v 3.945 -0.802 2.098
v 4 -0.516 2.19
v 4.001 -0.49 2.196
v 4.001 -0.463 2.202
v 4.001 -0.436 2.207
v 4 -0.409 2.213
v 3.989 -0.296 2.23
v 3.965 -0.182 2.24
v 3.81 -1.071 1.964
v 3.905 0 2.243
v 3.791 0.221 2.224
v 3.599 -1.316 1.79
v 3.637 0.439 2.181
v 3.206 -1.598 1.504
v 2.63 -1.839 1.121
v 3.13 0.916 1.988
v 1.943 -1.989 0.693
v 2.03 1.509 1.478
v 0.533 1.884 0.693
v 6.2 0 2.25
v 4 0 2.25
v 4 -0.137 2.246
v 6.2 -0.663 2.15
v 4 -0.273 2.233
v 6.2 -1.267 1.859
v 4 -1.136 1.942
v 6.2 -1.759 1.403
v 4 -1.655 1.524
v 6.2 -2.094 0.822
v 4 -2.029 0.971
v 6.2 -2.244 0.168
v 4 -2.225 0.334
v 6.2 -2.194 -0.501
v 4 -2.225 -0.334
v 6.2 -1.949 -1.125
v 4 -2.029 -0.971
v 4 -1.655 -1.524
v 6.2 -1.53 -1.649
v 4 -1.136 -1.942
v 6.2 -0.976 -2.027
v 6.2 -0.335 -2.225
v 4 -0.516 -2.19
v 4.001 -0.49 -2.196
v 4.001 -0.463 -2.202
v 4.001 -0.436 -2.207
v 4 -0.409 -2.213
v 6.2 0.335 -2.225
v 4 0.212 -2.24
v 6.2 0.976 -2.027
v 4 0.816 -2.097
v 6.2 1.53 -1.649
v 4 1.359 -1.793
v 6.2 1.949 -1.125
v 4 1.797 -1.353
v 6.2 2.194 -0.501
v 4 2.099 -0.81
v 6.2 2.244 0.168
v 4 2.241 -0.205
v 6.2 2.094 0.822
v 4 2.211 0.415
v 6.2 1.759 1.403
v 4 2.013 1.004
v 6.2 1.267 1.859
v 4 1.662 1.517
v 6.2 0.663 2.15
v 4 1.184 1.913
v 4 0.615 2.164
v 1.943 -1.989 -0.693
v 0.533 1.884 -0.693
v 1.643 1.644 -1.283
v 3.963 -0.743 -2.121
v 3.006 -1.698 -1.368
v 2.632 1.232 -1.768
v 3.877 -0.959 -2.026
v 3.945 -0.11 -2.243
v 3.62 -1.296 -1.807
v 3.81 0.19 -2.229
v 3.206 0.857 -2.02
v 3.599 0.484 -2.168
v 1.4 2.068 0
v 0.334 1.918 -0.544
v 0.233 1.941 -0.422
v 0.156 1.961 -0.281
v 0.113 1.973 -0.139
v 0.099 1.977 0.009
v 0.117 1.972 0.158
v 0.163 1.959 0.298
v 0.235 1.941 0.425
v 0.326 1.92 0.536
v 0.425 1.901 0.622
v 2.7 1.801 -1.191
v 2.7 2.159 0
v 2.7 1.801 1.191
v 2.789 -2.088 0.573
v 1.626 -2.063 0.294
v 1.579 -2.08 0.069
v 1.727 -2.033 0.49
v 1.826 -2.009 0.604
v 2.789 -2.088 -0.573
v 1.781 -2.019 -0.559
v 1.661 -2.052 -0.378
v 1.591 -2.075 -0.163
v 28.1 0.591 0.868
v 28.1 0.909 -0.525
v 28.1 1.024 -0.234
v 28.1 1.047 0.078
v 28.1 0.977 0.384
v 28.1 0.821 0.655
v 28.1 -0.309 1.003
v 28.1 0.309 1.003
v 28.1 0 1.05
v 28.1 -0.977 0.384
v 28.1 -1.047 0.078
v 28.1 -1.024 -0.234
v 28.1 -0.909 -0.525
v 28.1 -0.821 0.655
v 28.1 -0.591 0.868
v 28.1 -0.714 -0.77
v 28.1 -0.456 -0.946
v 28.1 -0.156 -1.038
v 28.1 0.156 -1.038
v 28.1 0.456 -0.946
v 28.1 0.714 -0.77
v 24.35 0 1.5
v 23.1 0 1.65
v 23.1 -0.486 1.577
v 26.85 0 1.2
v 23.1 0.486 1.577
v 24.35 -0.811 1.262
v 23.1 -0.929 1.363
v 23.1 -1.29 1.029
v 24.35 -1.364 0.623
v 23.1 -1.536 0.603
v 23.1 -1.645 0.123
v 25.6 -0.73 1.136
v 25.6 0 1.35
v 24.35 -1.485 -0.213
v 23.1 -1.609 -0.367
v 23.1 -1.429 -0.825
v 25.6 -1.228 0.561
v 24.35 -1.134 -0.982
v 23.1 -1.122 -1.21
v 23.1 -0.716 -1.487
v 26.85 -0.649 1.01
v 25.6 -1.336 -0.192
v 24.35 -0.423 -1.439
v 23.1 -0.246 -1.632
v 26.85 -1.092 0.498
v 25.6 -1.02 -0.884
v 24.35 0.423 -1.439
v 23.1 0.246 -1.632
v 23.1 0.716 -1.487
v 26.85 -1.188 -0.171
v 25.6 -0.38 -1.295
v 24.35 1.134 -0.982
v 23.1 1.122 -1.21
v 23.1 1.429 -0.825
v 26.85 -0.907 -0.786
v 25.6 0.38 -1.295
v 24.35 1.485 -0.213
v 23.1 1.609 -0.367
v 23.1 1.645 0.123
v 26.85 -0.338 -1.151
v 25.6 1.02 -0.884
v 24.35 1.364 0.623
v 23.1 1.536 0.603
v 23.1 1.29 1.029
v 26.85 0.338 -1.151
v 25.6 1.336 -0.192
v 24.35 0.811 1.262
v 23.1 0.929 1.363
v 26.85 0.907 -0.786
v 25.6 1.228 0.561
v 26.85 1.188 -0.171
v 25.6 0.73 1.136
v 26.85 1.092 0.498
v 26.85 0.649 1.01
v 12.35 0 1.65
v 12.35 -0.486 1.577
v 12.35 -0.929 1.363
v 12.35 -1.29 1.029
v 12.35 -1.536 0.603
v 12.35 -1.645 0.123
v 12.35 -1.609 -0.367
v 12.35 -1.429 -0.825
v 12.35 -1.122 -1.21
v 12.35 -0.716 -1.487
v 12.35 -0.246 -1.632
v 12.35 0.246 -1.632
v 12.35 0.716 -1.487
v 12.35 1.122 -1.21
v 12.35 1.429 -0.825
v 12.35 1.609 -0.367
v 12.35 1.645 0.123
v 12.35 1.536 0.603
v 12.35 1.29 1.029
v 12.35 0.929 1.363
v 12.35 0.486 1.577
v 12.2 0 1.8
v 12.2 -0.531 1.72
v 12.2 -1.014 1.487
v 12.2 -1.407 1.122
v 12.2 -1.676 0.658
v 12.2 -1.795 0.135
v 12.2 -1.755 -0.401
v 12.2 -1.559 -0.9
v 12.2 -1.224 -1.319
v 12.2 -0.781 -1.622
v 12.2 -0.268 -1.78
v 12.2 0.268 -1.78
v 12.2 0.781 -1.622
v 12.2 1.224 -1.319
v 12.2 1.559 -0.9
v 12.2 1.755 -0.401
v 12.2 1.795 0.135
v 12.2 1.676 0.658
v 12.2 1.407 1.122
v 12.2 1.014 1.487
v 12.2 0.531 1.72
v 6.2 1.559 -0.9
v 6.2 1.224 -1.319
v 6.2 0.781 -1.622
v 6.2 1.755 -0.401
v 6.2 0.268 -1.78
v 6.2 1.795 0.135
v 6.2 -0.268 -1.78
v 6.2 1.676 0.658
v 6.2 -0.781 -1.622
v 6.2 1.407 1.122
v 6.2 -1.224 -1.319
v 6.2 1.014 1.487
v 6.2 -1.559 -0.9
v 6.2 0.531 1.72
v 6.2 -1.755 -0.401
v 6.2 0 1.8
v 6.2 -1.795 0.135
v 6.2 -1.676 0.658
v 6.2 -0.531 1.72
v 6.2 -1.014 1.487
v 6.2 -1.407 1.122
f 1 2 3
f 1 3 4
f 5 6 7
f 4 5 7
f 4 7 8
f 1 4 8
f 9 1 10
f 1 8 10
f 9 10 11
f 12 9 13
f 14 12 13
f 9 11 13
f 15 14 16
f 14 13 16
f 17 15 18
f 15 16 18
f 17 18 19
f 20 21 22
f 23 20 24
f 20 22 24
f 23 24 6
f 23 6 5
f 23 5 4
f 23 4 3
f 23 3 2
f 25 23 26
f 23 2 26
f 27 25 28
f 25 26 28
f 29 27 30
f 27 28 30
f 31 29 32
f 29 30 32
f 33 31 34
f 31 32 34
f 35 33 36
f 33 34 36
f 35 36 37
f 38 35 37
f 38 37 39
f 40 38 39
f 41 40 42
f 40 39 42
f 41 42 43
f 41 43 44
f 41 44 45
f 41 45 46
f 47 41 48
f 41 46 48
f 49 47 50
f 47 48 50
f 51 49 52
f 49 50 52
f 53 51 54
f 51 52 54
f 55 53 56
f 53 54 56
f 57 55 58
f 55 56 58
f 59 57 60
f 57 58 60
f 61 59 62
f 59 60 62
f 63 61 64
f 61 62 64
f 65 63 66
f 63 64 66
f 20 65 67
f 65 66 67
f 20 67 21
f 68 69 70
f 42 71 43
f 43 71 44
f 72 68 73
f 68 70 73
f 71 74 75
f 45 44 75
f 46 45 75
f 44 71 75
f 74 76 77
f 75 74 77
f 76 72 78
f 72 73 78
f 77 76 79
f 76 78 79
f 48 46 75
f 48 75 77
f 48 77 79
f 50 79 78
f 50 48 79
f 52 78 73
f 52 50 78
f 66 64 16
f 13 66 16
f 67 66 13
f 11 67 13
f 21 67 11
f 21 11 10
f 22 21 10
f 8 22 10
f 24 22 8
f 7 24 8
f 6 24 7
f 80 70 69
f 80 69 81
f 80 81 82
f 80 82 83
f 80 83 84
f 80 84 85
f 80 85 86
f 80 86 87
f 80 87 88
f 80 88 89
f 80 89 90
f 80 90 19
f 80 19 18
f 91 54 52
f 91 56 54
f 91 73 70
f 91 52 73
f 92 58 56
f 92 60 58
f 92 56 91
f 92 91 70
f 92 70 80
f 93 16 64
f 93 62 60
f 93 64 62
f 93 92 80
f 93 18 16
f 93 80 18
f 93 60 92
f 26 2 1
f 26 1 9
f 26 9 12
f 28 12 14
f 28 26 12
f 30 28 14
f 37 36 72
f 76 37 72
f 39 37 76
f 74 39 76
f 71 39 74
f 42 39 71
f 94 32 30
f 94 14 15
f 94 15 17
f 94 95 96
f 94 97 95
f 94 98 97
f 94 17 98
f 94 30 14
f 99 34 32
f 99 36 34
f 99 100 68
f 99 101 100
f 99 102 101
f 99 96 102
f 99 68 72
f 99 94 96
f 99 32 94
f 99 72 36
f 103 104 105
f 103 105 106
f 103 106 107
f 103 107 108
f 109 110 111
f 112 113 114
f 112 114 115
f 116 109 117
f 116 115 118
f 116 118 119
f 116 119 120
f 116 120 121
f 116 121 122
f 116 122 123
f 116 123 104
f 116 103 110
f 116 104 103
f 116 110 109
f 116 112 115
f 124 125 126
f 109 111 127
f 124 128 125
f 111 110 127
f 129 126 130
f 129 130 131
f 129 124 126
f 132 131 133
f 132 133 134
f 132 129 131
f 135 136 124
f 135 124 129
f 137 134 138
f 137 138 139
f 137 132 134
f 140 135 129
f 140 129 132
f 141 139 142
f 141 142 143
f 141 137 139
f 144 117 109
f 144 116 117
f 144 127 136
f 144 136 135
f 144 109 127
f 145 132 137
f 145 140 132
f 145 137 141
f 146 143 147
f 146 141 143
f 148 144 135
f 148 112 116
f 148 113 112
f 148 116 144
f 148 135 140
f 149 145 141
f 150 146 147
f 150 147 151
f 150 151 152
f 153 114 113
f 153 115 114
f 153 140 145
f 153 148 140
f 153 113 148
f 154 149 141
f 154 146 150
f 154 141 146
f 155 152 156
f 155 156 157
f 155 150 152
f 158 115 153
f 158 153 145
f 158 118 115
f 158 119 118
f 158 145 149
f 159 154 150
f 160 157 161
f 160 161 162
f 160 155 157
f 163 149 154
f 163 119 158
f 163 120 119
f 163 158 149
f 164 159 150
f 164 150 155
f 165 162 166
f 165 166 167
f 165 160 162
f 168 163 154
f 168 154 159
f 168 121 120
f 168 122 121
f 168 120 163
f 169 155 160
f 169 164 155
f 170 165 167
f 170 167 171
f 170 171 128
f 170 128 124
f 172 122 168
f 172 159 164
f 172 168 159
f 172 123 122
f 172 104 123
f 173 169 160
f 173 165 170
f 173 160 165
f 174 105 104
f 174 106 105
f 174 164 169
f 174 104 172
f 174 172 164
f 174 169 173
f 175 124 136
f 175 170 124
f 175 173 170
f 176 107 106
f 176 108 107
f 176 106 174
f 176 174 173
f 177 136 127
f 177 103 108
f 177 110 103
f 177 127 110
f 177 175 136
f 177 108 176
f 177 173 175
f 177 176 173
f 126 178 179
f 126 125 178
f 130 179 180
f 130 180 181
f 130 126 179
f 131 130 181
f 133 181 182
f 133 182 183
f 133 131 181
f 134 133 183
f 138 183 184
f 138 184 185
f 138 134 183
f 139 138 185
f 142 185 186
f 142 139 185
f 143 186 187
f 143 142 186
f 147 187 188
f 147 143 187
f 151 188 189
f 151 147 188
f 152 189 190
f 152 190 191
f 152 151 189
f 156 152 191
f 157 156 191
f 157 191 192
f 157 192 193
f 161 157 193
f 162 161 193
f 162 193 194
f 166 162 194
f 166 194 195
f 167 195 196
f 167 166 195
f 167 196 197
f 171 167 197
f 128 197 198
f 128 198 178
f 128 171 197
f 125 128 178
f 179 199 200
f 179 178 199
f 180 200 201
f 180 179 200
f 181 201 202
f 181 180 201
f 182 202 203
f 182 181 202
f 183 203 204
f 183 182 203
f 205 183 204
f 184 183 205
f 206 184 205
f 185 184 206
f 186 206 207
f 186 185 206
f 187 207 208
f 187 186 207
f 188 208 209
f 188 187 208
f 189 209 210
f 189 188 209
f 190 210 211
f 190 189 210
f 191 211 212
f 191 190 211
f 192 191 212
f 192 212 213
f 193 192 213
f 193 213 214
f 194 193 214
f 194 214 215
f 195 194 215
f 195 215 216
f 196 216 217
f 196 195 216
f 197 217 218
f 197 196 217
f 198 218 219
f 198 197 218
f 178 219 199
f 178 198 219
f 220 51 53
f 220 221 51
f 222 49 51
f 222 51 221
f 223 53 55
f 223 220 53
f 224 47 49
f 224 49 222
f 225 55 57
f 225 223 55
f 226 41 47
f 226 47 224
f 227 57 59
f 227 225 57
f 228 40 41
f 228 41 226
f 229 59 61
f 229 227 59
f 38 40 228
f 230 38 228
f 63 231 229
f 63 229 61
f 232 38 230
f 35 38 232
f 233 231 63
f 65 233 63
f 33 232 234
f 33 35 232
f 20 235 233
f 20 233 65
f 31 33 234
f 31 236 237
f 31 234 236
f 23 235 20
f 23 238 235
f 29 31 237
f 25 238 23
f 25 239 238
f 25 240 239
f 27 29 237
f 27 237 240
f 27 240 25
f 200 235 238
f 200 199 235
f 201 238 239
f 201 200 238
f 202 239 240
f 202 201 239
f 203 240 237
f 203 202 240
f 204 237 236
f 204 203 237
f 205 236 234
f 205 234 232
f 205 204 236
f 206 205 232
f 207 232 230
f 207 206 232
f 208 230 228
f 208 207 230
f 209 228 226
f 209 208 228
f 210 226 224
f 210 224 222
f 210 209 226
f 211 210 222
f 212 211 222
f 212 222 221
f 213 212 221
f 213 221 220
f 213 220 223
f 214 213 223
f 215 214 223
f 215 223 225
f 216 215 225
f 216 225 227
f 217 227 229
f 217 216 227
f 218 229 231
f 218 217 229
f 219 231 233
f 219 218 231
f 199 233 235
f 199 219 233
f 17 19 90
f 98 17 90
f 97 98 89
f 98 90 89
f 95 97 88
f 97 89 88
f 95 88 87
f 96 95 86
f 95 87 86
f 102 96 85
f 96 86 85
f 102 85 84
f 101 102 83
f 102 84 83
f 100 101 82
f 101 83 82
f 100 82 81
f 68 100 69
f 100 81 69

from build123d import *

# Parameters (mm, degrees)
CORTE_EXTRUS_O2_DEPTH = 5
CORTE_EXTRUS_O1_DEPTH = 10


with BuildPart() as part:
    # Esboço1 → Revolução1 (revolve)
    with BuildSketch(Plane.XY, mode=Mode.PRIVATE) as revolu_o1_sk:
        Polygon((6.2, 2.25), (6.2, 1.8), (12.2, 1.8), (12.35, 1.65), (23.1, 1.65), (28.1, 1.05), (28.1, 0), (0, 0), (0, 1.970292752), (4, 2.25), (4.7, 2.25), align=None)
    revolve(revolu_o1_sk.sketch.rotate(Axis((0, 0, 0), (1, 0, 0)), 90), axis=Axis((0, 0, 0), (1, 0, 0)))

    # Esboço2 → Corte-extrusão2 (cut, symmetric)
    with BuildSketch(Plane.XY):
        Polygon((0, 1.970292752), (1.471712801, -2.073204936), (2.326234143, -4.420983029), (-0.931248246, -4.420983029), (-0.931248246, 3.056454726), (-0.395330628, 3.056454726), align=None)
    extrude(amount=CORTE_EXTRUS_O2_DEPTH, both=True, mode=Mode.SUBTRACT)

    # Esboço3 → Corte-extrusão1 (cut, along a direction that is not the sketch's normal)
    with BuildSketch(Plane(origin=(3.863561719, 2.25, 0), x_dir=(0, 0, -1), z_dir=(0, 1, 0))):
        with BuildLine():
            Line((-4.503319596, -3.136438281), (-0.692801568, 3.463572547))
            ThreePointArc((-0.692801568, 3.463572547), (0, 3.863561719), (0.692801568, 3.463572547))
            Line((0.692801568, 3.463572547), (4.503319596, -3.136438281))
            ThreePointArc((4.503319596, -3.136438281), (0, 13.670179255), (-4.503319596, -3.136438281))
        make_face()
    extrude(amount=-CORTE_EXTRUS_O1_DEPTH, dir=(-0.3420201433256694, 0.9396926207859082, 0), mode=Mode.SUBTRACT)


solid = part.part
